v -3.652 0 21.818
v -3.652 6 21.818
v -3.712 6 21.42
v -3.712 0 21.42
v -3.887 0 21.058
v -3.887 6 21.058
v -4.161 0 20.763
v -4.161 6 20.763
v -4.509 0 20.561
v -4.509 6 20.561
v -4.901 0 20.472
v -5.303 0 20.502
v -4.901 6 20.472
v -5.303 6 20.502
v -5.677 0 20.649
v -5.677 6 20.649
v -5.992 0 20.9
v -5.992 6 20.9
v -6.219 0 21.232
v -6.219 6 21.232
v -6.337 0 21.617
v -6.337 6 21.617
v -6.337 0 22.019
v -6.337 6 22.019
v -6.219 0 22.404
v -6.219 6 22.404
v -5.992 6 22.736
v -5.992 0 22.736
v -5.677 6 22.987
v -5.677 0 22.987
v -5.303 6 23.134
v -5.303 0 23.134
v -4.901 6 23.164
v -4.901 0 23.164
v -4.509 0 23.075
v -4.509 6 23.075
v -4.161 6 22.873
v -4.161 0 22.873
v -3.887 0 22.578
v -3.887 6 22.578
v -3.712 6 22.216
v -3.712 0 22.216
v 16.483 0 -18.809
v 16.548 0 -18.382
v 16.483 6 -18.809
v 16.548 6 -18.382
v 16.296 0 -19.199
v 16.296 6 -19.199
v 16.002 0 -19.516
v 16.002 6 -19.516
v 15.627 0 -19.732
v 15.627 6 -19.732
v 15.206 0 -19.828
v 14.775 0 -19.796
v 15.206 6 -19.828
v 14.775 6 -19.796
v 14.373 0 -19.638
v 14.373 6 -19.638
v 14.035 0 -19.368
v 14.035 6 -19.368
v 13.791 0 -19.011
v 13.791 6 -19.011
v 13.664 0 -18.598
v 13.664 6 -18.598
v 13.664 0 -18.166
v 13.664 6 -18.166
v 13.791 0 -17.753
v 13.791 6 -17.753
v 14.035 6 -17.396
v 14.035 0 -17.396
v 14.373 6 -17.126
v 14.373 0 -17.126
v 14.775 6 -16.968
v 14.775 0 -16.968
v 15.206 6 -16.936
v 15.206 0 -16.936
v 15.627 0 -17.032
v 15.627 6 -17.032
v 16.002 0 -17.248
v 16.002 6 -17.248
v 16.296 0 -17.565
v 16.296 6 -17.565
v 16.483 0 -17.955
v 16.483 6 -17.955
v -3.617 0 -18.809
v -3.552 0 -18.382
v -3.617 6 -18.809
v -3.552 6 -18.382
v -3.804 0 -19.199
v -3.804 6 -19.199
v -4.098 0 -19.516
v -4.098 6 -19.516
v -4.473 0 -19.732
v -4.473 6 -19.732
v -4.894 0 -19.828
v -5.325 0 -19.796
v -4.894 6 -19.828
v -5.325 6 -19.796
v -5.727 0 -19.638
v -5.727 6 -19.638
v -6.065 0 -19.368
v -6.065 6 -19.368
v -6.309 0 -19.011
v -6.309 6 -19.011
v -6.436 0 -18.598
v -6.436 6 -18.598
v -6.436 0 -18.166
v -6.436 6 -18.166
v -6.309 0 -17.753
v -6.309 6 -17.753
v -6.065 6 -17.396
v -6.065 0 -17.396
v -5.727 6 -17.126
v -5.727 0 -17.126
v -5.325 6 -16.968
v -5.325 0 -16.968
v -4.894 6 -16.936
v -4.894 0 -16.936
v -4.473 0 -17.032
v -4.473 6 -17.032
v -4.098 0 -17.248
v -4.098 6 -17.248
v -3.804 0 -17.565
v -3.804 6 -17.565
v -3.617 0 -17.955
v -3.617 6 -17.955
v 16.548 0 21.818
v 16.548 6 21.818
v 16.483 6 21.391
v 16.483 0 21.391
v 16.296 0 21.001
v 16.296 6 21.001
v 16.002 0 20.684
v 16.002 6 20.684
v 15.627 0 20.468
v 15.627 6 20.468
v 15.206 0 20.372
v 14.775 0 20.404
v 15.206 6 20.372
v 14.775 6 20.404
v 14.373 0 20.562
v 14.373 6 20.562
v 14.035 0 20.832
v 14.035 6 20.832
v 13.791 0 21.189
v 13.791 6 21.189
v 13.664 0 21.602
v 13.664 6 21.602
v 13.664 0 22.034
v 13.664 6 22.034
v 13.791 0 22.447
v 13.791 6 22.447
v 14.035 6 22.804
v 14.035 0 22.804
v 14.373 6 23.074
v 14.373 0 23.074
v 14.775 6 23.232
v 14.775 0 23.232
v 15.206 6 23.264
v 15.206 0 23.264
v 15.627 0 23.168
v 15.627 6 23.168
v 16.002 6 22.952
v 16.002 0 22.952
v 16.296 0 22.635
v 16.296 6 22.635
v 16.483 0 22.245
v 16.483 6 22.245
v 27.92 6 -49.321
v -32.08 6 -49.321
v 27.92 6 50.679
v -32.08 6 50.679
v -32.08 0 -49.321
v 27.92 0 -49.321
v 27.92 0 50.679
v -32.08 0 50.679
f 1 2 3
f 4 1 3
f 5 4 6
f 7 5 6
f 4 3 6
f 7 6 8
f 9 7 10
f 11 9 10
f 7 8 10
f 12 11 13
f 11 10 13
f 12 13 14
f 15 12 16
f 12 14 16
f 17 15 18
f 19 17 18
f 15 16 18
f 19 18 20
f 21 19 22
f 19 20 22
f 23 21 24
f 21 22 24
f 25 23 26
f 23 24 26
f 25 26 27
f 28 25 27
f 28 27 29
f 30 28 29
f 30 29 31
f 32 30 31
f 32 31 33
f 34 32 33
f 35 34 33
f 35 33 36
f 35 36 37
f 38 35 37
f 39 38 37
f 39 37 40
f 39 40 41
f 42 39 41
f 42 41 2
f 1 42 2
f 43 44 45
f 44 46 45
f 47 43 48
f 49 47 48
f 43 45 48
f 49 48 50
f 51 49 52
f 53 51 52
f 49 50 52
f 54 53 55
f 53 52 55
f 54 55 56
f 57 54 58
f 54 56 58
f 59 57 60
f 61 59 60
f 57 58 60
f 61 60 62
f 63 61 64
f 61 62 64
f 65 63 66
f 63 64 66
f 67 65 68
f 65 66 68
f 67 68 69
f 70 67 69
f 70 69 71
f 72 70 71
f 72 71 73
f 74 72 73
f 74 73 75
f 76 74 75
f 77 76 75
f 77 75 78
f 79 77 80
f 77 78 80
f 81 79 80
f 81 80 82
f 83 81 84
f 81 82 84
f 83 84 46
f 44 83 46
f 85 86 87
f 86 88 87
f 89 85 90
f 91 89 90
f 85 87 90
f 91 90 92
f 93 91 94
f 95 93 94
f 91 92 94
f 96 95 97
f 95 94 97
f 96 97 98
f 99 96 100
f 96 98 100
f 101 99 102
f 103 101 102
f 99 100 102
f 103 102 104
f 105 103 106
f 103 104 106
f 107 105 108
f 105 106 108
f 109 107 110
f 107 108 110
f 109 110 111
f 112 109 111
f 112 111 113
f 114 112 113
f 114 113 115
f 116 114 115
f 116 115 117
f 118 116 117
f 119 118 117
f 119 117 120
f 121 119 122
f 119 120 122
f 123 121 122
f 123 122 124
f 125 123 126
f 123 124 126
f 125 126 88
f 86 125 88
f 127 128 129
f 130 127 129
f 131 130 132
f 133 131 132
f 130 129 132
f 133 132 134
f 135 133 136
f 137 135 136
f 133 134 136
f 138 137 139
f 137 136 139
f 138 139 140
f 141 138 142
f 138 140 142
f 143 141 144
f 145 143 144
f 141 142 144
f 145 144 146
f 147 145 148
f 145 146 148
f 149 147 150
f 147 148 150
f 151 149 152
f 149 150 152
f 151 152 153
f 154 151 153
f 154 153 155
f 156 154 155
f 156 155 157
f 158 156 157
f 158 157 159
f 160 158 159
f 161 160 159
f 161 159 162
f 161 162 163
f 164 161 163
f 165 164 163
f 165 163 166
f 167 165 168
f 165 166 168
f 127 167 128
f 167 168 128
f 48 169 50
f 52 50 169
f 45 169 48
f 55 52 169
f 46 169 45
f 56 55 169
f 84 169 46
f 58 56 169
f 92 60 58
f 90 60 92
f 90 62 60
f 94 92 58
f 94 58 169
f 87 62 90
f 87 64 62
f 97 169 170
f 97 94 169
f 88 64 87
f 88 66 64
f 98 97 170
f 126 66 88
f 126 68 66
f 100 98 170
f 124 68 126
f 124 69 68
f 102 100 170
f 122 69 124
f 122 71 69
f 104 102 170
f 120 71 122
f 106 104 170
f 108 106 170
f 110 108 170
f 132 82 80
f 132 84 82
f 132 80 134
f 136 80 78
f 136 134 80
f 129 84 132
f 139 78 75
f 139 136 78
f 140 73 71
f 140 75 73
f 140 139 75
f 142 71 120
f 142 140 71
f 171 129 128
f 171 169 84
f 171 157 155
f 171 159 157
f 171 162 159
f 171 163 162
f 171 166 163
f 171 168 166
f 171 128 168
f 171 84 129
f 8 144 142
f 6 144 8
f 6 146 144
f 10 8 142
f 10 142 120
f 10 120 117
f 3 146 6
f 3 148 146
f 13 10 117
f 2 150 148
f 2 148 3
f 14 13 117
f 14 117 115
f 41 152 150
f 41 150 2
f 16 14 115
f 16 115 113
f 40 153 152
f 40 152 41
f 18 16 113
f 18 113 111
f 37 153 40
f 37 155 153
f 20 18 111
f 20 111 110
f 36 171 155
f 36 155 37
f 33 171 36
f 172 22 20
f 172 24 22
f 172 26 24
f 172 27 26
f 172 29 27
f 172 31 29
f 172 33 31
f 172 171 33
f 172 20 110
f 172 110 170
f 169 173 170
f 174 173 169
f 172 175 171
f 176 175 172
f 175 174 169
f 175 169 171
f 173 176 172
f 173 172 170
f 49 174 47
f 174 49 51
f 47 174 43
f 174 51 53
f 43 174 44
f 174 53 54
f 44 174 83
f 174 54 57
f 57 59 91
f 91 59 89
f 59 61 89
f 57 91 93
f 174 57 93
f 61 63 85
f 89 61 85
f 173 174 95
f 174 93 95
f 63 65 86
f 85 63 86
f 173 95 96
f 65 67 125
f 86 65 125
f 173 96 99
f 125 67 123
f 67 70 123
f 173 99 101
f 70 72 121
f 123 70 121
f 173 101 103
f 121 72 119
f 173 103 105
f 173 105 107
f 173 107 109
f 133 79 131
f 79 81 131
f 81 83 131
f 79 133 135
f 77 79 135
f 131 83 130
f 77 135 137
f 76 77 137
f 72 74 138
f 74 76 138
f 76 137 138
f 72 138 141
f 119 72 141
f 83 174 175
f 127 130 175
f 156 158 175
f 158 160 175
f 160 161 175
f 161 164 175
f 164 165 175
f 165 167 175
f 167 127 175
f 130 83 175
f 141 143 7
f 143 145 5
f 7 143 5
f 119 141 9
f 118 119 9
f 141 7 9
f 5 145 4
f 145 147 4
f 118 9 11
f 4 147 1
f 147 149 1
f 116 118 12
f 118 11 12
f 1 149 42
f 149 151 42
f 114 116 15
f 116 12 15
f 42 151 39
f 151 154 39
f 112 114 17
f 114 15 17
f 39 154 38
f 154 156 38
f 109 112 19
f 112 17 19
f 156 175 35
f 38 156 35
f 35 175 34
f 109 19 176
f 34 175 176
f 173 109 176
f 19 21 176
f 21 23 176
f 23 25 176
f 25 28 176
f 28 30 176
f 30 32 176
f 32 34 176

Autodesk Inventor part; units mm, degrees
ref_plane "YZ Plane" through (0, 0, 0) normal (1, 0, 0) x (0, 1, 0)
ref_plane "XZ Plane" through (0, 0, 0) normal (0, 1, 0) x (-1, 0, 0)
ref_plane "XY Plane" through (0, 0, 0) normal (0, 0, 1) x (1, 0, 0)
sketch "스케치1" plane through (0, 0, 0) normal (0, 1, 0) x (-1, 0, 0)
  line L0 (-5.3697, -35.4212) -> (-5.3697, -37.6212)
  line L1 (-5.3697, -37.6212) -> (-10.5697, -37.6212)
  line L2 (-10.5697, -37.6212) -> (-10.5697, -35.4212)
  line L3 (-10.5697, -35.4212) -> (-5.3697, -35.4212)
  line L4 (10.6803, 36.7788) -> (10.6803, 38.9788)
  line L5 (10.6803, 38.9788) -> (14.7303, 38.9788)
  line L6 (14.7303, 38.9788) -> (14.7303, 36.7788)
  line L7 (14.7303, 36.7788) -> (10.6803, 36.7788)
  line L8 (14.7303, -35.4212) -> (14.7303, -37.6212)
  line L9 (14.7303, -37.6212) -> (9.5303, -37.6212)
  line L10 (9.5303, -37.6212) -> (9.5303, -35.4212)
  line L11 (9.5303, -35.4212) -> (14.7303, -35.4212)
  line L12 (-5.3697, 36.7788) -> (-10.5697, 36.7788)
  line L13 (-10.5697, 36.7788) -> (-10.5697, 38.9788)
  line L14 (-10.5697, 38.9788) -> (-5.3697, 38.9788)
  line L15 (-5.3697, 38.9788) -> (-5.3697, 36.7788)
  circle A0 centre (12.1303, -19.4212) radius 1.45
  circle A1 centre (-7.9697, -19.4212) radius 1.45
  circle A2 centre (12.1303, 20.7788) radius 1.45
  circle A3 centre (-7.9697, 20.7788) radius 1.45
  line L16 (22.1803, -39.5212) -> (-18.0197, -39.5212)
  line L17 (22.1803, 40.8788) -> (22.1803, -39.5212)
  line L18 (-18.0197, 40.8788) -> (22.1803, 40.8788)
  line L19 (-18.0197, -39.5212) -> (-18.0197, 40.8788)
  line L20 (-27.9197, 50.6788) -> (32.0803, 50.6788)
  line L21 (32.0803, 50.6788) -> (32.0803, -49.3212)
  line L22 (32.0803, -49.3212) -> (-27.9197, -49.3212)
  line L23 (-27.9197, -49.3212) -> (-27.9197, 50.6788)
  line L24 (-27.9197, 50.6788) -> (32.0803, -49.3212) construction
  line L25 (32.0803, 50.6788) -> (-27.9197, -49.3212) construction
  circle A4 centre (12.1303, -19.4212) radius 1.35
  circle A5 centre (-7.9697, -19.4212) radius 1.35
  circle A6 centre (-7.9697, 20.7788) radius 1.35
  circle A7 centre (12.1303, 20.7788) radius 1.35
  circle A8 centre (2.0803, 0.6788) radius 4.7553
  point P0 (0, 0)
  dimension "d0" = 60
  dimension "d1" = 100
  dimension "d4" = 2.7
  dimension "d5" = 2.7
  dimension "d6" = 2.7
  dimension "d7" = 2.7
extrude "돌출1" add sketch "스케치1" along normal blind 6 contours L0 L1 L2 L3 | L4 L5 L6 L7 | L8 L9 L10 L11 | L12 L13 L14 L15 | A0 | A1 | A2 | A3 | L16 L19 L18 L17 | L20 L21 L22 L23 | A4 | A5 | A6 | A7 | A8
sketch "스케치2" plane through (0, 6, 0) normal (0, 1, 0) x (1, 0, 0)
  line L0 (27.9197, 49.3212) -> (-32.0803, 49.3212) projected
  line L1 (-32.0803, 49.3212) -> (-32.0803, -50.6788) projected
  line L2 (-32.0803, -50.6788) -> (27.9197, -50.6788) projected
  line L3 (27.9197, -50.6788) -> (27.9197, 49.3212) projected
  line L4 (58.4667, -26.0223) -> (58.4667, -28.2223)
  line L5 (58.4667, -28.2223) -> (53.2667, -28.2223)
  line L6 (53.2667, -28.2223) -> (53.2667, -26.0223)
  line L7 (53.2667, -26.0223) -> (58.4667, -26.0223)
  circle A0 centre (15.0977, -21.818) radius 1.45
  circle A1 centre (-5.0023, -21.818) radius 1.45
  line L8 (73.3667, -26.0223) -> (78.5667, -26.0223)
  line L9 (78.5667, -26.0223) -> (78.5667, -28.2223)
  line L10 (73.3667, -28.2223) -> (73.3667, -26.0223)
  line L11 (78.5667, -28.2223) -> (73.3667, -28.2223)
  line L12 (86.0167, -30.1223) -> (45.8167, -30.1223)
  line L13 (74.5167, 46.1777) -> (74.5167, 48.3777)
  line L14 (74.5167, 48.3777) -> (78.5667, 48.3777)
  line L15 (78.5667, 48.3777) -> (78.5667, 46.1777)
  line L16 (45.8167, -30.1223) -> (45.8167, 50.2777)
  line L17 (86.0167, 50.2777) -> (86.0167, -30.1223)
  circle A2 centre (-5.0023, 18.382) radius 1.45
  circle A3 centre (15.0977, 18.382) radius 1.45
  line L18 (58.4667, 46.1777) -> (53.2667, 46.1777)
  line L19 (45.8167, 50.2777) -> (86.0167, 50.2777)
  line L20 (53.2667, 46.1777) -> (53.2667, 48.3777)
  line L21 (53.2667, 48.3777) -> (58.4667, 48.3777)
  line L22 (58.4667, 48.3777) -> (58.4667, 46.1777)
  line L23 (78.5667, 46.1777) -> (74.5167, 46.1777)
  line L24 (-26.6842, 49.3212) -> (33.3158, 49.3212)
  line L25 (33.3158, 49.3212) -> (33.3158, -50.6788)
  line L26 (33.3158, -50.6788) -> (-26.6842, -50.6788)
  line L27 (-26.6842, -50.6788) -> (-26.6842, 49.3212)
  line L28 (-26.6842, 49.3212) -> (33.3158, -50.6788) construction
  line L29 (33.3158, 49.3212) -> (-26.6842, -50.6788) construction
  circle A4 centre (15.0977, -21.818) radius 1.35
  circle A5 centre (-5.0023, -21.818) radius 1.35
  circle A6 centre (-5.0023, 18.382) radius 1.35
  circle A7 centre (15.0977, 18.382) radius 1.35
  circle A8 centre (3.3158, -0.6788) radius 4.7553
  circle A9 centre (-2.0803, -0.6788) radius 10.0549
  line L30 (-6.7392, -0.6788) -> (3.3158, -0.6788)
  point P0 (0, 0)
  point P1 (2.9674, -2.3969)
  dimension "d8" = 60
  dimension "d9" = 100
  dimension "d10" = 2.7
  dimension "d11" = 2.7
  dimension "d12" = 2.7
  dimension "d13" = 2.7
extrude "돌출2" cut sketch "스케치2" against normal blind 6 contours A0 | A2 | A3 | A4 | A5 | A6 | A7
properties part number "feet" material "PMMA 플라스틱"
